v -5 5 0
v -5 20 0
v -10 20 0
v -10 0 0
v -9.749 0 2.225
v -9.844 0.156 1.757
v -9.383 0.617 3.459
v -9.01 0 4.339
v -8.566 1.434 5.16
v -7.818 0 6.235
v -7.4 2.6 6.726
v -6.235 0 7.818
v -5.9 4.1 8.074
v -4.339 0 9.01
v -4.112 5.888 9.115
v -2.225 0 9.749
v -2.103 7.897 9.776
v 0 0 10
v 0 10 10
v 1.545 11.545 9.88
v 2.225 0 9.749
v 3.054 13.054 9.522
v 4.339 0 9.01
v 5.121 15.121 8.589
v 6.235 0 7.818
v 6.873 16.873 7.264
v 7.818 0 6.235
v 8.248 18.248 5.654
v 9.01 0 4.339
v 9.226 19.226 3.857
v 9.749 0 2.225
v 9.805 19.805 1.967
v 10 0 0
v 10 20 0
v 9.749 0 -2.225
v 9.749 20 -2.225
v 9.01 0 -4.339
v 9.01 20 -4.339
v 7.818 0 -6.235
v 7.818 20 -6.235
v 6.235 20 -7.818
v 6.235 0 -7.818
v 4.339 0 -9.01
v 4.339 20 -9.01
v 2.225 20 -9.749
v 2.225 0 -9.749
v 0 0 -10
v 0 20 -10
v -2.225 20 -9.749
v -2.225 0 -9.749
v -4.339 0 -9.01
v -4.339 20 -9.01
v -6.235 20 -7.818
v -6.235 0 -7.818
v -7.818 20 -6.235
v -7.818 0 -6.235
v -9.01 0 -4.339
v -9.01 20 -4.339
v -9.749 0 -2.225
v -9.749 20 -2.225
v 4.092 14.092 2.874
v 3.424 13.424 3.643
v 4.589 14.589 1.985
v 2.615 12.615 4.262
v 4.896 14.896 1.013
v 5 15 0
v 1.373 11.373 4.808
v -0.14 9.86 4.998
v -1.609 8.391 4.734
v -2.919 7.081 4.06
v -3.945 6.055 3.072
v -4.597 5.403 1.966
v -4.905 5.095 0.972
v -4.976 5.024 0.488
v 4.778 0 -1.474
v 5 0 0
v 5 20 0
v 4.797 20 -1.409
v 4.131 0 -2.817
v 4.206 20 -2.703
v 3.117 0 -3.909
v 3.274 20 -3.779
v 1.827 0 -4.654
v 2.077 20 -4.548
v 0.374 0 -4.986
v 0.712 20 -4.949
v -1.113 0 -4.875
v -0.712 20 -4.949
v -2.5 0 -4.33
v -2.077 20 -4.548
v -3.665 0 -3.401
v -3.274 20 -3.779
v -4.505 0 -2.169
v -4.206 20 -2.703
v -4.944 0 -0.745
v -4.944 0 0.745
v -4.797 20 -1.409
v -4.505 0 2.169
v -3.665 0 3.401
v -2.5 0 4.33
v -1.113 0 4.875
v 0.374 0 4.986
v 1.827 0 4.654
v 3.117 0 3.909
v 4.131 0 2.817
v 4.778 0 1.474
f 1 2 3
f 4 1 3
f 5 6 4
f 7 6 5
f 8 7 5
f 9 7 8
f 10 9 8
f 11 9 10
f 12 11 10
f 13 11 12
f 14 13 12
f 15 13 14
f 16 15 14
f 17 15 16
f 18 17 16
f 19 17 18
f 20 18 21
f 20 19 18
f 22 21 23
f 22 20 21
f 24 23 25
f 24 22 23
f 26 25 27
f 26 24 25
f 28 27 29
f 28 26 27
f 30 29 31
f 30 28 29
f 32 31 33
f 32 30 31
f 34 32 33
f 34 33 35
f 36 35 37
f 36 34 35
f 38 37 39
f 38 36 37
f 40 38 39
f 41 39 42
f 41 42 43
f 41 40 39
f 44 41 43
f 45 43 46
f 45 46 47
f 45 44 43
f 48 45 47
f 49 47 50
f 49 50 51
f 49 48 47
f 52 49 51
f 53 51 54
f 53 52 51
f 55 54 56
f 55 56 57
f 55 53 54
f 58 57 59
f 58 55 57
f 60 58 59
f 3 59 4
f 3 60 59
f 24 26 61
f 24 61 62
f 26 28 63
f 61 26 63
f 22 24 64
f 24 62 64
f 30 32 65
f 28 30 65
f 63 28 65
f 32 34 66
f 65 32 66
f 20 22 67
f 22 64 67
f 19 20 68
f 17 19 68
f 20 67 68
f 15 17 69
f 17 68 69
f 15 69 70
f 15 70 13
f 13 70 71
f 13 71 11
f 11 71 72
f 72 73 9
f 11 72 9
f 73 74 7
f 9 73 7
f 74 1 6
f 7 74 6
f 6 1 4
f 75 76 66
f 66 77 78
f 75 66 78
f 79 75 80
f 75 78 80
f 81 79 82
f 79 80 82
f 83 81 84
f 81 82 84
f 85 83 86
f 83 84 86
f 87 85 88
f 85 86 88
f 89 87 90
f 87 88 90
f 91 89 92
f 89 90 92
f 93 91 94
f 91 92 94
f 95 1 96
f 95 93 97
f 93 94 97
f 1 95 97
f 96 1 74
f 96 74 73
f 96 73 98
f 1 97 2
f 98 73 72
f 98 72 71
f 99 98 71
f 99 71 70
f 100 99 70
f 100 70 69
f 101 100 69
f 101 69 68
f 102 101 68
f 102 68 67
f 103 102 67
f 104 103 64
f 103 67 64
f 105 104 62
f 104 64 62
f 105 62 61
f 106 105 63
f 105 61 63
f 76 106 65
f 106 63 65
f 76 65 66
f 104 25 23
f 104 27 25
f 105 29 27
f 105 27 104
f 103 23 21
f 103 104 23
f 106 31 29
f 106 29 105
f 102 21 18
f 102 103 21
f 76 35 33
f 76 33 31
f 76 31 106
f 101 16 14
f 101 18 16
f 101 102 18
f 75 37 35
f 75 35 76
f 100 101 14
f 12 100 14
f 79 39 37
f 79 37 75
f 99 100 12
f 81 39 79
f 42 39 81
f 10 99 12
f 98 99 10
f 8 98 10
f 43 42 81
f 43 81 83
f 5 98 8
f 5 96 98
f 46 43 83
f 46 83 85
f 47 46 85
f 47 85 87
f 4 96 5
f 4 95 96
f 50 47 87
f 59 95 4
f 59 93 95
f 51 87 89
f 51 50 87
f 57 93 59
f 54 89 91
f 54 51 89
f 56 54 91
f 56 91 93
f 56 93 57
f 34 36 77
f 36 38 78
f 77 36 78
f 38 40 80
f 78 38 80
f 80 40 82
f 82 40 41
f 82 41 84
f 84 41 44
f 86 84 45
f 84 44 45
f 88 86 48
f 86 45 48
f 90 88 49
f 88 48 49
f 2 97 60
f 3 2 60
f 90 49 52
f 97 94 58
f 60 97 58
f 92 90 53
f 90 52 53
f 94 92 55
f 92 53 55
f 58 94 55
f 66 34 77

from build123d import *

# Parameters (mm, degrees)
SKETCH1_W          = 10
SKETCH1_H          = 20
SKETCH2_R          = 5
CUT_EXTRUDE4_DEPTH = 20
CUT_EXTRUDE5_DEPTH = 10


with BuildPart() as part:
    # Sketch1 → Revolve1 (revolve)
    with BuildSketch(Plane.XY):
        with Locations((5, 10)):
            Rectangle(SKETCH1_W, SKETCH1_H)
    revolve(axis=Axis((0, 0, 0), (0, 1, 0)))

    # Sketch2 → Cut-Extrude4 (cut)
    with BuildSketch(Plane(origin=(0, 20, 0), x_dir=(1, 0, 0), z_dir=(0, 1, 0))):
        Circle(SKETCH2_R)
    extrude(amount=-CUT_EXTRUDE4_DEPTH, mode=Mode.SUBTRACT)

    # Sketch4 → Cut-Extrude5 (cut)
    with BuildSketch(Plane.XY):
        Polygon((10, 20), (-10, 0), (-10, 20), align=None)
    extrude(amount=CUT_EXTRUDE5_DEPTH, mode=Mode.SUBTRACT)


solid = part.part
